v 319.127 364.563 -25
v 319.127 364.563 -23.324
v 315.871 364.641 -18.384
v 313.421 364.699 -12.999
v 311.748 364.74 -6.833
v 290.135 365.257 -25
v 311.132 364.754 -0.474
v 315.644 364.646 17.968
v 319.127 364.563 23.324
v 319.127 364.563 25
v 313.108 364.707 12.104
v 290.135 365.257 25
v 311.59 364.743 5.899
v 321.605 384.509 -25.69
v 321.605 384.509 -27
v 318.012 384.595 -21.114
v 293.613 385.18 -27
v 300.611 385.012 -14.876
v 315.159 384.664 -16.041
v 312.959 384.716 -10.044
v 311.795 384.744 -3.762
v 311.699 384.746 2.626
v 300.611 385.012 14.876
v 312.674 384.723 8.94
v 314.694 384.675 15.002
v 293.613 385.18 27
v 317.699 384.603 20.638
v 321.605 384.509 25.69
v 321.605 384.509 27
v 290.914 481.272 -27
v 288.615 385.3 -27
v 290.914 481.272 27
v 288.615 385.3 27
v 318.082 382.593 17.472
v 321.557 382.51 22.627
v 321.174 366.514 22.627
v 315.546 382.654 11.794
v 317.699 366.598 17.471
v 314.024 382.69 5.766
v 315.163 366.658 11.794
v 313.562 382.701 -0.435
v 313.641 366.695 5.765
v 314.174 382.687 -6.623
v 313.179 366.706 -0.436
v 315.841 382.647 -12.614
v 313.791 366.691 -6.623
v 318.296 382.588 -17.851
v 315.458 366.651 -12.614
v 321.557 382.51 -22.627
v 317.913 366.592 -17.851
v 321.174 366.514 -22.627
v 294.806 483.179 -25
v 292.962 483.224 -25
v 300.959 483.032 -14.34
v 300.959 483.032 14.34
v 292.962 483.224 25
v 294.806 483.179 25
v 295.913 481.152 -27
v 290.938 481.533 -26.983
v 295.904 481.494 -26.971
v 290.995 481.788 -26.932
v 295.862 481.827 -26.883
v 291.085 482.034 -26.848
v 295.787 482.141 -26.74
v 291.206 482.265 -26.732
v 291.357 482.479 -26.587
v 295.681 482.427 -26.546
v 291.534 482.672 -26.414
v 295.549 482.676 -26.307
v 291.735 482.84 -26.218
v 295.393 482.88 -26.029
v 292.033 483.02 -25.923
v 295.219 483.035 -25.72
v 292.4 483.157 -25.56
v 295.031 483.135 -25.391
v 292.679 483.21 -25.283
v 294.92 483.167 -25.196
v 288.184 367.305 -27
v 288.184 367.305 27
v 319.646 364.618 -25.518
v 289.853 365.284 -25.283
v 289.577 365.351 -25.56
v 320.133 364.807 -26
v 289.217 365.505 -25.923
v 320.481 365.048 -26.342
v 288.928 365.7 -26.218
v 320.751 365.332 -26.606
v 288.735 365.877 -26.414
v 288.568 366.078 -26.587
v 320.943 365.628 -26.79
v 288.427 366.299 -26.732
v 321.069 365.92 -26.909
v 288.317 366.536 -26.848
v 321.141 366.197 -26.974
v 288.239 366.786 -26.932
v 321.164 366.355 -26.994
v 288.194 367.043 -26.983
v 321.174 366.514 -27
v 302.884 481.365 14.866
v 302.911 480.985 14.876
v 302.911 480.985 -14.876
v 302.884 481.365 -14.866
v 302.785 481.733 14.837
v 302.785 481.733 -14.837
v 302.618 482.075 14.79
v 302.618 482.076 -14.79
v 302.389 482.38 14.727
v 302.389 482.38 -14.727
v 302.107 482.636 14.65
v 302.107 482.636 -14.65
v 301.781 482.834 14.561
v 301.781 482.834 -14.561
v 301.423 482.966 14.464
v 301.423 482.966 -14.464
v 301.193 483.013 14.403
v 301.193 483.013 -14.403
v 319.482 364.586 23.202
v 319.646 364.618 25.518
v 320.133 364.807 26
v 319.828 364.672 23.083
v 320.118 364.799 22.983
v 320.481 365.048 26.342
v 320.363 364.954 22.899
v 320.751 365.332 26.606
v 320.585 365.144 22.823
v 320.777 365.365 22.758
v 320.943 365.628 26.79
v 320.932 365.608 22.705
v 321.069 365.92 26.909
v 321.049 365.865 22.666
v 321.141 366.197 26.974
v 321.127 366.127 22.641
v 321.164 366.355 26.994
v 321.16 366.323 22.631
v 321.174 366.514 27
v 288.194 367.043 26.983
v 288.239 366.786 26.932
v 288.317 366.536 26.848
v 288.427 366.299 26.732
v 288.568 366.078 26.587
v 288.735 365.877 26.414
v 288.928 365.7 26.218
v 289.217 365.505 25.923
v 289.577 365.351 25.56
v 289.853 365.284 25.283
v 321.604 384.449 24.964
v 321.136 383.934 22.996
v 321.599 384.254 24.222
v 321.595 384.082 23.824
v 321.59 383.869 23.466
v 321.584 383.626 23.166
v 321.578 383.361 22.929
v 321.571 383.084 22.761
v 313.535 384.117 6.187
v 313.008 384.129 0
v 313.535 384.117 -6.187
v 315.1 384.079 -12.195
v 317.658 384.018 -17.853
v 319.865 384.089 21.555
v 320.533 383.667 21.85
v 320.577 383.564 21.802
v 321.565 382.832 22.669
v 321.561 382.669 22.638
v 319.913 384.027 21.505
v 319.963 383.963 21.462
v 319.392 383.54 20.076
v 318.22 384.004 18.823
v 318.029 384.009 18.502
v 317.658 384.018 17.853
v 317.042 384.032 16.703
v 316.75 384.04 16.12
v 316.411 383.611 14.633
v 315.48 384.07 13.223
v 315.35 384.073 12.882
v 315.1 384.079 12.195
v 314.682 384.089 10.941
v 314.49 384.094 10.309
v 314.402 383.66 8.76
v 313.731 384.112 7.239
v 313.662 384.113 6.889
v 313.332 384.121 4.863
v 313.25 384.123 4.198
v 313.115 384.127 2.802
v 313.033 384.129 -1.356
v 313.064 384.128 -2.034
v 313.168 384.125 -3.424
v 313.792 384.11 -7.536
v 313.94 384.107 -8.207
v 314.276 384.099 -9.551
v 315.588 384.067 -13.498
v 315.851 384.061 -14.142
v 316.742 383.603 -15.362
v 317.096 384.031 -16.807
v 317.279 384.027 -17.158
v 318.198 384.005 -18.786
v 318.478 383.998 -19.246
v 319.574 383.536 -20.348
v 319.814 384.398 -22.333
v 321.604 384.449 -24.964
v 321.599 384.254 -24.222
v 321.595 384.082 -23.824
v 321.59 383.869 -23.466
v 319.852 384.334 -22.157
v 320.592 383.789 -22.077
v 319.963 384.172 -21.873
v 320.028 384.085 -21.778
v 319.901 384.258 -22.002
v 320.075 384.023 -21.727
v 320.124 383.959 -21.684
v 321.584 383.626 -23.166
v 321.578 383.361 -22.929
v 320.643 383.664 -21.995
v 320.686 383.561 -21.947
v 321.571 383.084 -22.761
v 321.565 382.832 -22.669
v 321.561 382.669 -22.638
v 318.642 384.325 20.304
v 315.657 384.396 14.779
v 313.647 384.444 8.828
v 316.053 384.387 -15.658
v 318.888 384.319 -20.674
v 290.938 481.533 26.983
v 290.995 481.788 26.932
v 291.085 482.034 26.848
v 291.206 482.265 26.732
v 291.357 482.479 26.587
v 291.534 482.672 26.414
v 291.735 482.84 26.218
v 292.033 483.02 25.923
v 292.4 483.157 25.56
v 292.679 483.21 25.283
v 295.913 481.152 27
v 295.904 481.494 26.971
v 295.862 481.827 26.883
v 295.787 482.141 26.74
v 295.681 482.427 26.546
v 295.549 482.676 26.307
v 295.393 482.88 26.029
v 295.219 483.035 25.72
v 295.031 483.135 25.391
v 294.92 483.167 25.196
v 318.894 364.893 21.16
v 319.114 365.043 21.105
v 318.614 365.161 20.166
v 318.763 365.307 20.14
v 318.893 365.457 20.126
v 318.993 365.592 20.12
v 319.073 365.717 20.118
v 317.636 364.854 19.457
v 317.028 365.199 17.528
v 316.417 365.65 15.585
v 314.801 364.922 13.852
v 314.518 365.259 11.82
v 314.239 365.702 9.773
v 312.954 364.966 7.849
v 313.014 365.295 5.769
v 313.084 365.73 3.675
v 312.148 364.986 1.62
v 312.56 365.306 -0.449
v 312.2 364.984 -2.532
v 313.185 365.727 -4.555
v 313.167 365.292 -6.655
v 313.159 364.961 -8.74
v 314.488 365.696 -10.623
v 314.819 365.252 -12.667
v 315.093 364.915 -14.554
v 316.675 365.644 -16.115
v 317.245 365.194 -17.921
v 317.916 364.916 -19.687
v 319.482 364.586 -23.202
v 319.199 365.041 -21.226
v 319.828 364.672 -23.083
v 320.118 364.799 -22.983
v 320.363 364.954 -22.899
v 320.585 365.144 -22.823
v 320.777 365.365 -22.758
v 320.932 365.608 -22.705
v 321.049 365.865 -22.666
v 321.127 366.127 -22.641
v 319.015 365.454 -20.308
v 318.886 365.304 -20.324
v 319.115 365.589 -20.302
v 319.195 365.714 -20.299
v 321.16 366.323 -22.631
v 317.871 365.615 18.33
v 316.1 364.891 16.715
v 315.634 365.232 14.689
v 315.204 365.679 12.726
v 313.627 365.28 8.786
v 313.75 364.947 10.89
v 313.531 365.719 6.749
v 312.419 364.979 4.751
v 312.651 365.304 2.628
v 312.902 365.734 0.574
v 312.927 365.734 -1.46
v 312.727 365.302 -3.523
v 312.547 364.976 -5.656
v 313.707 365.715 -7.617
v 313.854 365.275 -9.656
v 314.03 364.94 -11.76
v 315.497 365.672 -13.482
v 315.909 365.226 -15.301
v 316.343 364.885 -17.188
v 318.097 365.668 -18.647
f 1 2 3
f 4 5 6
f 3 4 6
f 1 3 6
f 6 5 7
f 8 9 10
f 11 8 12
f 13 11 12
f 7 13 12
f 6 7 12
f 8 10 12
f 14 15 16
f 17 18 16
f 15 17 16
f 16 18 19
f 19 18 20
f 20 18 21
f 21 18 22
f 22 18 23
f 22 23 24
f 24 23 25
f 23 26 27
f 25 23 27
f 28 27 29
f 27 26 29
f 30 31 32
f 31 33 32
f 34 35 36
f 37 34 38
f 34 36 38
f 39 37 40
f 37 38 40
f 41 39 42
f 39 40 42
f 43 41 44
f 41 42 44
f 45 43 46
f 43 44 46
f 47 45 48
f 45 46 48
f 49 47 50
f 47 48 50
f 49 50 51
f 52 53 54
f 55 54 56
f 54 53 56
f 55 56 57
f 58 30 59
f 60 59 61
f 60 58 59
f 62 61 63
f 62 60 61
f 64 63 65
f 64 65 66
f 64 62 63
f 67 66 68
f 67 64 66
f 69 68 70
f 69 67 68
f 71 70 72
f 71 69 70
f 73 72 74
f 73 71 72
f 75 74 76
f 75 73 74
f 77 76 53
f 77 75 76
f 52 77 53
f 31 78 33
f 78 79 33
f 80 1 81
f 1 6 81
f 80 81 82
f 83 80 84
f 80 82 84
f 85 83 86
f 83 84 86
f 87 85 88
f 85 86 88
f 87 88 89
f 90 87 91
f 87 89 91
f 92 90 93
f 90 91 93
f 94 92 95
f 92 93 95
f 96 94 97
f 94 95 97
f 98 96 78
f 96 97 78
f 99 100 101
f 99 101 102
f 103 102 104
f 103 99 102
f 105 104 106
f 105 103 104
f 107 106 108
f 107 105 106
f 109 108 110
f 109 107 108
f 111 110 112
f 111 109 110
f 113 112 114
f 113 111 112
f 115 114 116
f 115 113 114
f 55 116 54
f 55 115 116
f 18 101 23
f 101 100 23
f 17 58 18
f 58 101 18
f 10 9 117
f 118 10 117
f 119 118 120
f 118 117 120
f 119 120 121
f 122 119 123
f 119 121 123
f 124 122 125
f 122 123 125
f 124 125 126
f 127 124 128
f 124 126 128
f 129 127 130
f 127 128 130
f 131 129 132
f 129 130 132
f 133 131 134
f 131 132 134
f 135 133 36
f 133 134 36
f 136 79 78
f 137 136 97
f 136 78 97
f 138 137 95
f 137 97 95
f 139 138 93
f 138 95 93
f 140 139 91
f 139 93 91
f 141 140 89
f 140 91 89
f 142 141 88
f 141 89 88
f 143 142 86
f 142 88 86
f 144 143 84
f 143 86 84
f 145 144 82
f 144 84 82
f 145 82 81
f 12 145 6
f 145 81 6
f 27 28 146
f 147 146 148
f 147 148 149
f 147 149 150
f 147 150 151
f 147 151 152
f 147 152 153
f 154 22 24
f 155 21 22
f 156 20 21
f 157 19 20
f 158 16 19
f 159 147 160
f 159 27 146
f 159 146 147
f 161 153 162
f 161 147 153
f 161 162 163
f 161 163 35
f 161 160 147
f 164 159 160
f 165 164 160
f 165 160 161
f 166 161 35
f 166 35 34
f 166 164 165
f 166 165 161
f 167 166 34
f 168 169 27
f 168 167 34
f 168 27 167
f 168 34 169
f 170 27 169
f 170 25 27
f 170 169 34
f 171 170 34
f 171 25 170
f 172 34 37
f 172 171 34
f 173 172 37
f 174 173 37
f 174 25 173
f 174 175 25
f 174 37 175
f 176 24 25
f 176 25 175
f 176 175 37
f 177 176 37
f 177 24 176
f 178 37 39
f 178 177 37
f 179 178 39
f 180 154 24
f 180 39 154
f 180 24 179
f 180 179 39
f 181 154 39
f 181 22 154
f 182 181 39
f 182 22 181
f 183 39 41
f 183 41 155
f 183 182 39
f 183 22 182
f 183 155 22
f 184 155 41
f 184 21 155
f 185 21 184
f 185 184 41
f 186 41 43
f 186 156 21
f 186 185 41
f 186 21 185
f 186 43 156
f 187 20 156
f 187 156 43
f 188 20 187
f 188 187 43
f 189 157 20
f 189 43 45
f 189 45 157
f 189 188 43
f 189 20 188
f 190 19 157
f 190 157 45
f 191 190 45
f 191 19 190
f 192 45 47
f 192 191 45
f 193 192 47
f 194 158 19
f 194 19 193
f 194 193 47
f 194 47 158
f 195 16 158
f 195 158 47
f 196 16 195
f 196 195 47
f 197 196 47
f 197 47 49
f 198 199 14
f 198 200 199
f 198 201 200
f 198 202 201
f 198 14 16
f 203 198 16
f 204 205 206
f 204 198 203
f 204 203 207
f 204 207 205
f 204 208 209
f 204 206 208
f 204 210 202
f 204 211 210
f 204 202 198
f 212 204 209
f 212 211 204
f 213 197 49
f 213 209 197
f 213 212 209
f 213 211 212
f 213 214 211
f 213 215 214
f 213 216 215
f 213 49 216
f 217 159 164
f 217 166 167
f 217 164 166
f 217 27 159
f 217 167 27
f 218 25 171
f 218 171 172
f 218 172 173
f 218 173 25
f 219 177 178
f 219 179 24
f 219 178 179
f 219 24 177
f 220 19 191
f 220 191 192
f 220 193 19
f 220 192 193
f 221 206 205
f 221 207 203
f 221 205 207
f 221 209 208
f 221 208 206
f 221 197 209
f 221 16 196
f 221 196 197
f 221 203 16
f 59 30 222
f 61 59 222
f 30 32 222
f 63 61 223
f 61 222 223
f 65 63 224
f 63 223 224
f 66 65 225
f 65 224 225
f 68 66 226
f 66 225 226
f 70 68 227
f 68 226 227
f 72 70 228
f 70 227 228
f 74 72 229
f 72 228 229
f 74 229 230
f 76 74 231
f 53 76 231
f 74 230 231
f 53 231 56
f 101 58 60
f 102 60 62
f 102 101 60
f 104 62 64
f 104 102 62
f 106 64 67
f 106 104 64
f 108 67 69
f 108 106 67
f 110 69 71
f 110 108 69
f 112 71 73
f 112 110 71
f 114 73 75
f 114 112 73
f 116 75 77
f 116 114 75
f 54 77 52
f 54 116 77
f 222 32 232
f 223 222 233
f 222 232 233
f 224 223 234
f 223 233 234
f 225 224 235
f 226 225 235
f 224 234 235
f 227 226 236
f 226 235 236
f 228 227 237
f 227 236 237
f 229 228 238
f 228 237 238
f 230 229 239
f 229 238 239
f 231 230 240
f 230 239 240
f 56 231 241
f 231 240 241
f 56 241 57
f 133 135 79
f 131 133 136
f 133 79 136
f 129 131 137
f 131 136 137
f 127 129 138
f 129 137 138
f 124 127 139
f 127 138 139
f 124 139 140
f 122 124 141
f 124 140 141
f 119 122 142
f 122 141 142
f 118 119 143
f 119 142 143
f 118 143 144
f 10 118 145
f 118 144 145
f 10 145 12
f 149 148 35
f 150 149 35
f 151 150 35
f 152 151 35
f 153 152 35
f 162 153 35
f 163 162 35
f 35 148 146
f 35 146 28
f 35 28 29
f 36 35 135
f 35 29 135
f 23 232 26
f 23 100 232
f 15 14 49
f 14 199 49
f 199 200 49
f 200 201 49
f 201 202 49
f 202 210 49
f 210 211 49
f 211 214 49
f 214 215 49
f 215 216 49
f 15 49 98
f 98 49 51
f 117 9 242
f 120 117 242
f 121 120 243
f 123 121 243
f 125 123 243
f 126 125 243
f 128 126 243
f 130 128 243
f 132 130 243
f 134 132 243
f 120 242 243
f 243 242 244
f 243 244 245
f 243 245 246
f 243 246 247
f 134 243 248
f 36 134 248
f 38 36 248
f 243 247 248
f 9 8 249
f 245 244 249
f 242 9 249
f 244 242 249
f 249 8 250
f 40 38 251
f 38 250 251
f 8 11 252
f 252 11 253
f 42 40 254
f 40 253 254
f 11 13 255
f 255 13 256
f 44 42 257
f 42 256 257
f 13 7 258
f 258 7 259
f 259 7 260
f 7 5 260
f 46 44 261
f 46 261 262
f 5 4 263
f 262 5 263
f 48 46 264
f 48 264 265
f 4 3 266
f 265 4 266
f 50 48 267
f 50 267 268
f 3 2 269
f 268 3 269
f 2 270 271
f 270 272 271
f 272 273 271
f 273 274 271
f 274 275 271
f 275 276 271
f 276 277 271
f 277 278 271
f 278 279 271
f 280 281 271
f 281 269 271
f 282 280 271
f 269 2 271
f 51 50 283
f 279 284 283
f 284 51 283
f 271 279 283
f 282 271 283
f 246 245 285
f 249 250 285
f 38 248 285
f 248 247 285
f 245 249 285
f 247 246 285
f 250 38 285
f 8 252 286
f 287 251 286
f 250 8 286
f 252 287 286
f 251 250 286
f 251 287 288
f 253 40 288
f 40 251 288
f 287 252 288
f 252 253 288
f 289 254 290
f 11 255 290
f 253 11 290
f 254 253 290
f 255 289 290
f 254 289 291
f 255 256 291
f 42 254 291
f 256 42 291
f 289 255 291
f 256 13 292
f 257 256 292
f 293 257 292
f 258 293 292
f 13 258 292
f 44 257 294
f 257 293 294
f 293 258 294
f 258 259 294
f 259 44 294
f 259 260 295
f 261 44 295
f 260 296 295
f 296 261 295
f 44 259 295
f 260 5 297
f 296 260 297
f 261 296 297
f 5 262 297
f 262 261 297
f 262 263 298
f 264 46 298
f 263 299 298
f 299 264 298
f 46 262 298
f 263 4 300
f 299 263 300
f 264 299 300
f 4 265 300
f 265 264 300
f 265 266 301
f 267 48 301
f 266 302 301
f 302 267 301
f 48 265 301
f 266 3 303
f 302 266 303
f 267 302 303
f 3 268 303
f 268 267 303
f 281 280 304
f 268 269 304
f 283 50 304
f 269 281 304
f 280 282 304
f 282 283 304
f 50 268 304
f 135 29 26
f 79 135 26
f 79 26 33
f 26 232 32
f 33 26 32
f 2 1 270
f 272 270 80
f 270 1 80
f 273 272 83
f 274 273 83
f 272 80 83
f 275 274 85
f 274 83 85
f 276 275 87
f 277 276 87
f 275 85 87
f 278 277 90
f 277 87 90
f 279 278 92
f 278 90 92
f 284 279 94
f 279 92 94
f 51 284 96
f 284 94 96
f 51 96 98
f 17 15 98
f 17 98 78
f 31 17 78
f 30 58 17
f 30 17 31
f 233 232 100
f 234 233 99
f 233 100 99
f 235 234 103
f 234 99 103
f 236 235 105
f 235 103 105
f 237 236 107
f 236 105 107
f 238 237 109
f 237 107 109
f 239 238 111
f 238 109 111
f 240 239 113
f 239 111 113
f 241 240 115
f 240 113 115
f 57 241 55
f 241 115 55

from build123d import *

# Parameters (mm, degrees)
BOSS_EXTRUDE1_DEPTH = 27
SKETCH2_R           = 36
CUT_EXTRUDE1_DEPTH  = 54
CHAMFER1_SIZE       = 7
CHAMFER1_SIZE2      = 12.124355653
CHAMFER2_SIZE       = 7
CHAMFER2_SIZE2      = 12.124355653
FILLET1_R           = 2


with BuildPart() as part:
    # Sketch1 → Boss-Extrude1 (new body, symmetric)
    with BuildSketch(Plane.XY):
        Polygon((302.95878724, 482.984033971), (300.611268609, 385.012154555), (321.60524277, 384.509114849), (321.126157335, 364.514853743), (288.135626511, 365.305344711), (288.614711888, 385.299603421), (290.962230577, 483.271485232), align=None)
    extrude(amount=BOSS_EXTRUDE1_DEPTH, both=True)

    # Sketch2 → Cut-Extrude1 (cut)
    with BuildSketch(Plane(origin=(8.913446831, 371.99582848, 0), x_dir=(0.999713055, -0.023954272, 0), z_dir=(-0.023954272, -0.999713055, 0))):
        with Locations((340.302324012, 0)):
            Circle(SKETCH2_R)
    extrude(amount=-CUT_EXTRUDE1_DEPTH, mode=Mode.SUBTRACT)

    # Chamfer1
    chamfer1_edges = [part.edges().sort_by_distance(p)[0] for p in [
        (301.785027925, 433.998094263, 27),
    ]]
    chamfer1_side = [part.faces().sort_by_distance(p)[0] for p in [
        (299.052126571, 412.848339787, 27),
    ]]
    chamfer(chamfer1_edges, length=CHAMFER1_SIZE, length2=CHAMFER1_SIZE2, reference=chamfer1_side[0])

    # Chamfer2
    chamfer2_edges = [part.edges().sort_by_distance(p)[0] for p in [
        (301.785027925, 433.998094263, -27),
    ]]
    chamfer2_side = [part.faces().sort_by_distance(p)[0] for p in [
        (299.052126571, 412.848339787, -27),
    ]]
    chamfer(chamfer2_edges, length=CHAMFER2_SIZE, length2=CHAMFER2_SIZE2, reference=chamfer2_side[0])

    # Fillet1
    fillet1_edges = [part.edges().sort_by_distance(p)[0] for p in [
        (321.126157335, 364.514853743, -24.813708499),
        (288.135626511, 365.305344711, 0),
        (290.962230577, 483.271485232, 0),
        (304.630891923, 364.910099227, -27),
        (321.126157335, 364.514853743, 24.813708499),
        (313.128452892, 364.706487917, 0),
        (313.607538327, 384.700749023, 0),
        (299.459791547, 483.067873922, 20.937822174),
        (302.95878724, 482.984033971, 0),
        (299.459791547, 483.067873922, -20.937822174),
        (304.630891923, 364.910099227, 27),
        (293.461513215, 483.211599553, -27),
        (293.461513215, 483.211599553, 27),
    ]]
    fillet(fillet1_edges, radius=FILLET1_R)


solid = part.part
